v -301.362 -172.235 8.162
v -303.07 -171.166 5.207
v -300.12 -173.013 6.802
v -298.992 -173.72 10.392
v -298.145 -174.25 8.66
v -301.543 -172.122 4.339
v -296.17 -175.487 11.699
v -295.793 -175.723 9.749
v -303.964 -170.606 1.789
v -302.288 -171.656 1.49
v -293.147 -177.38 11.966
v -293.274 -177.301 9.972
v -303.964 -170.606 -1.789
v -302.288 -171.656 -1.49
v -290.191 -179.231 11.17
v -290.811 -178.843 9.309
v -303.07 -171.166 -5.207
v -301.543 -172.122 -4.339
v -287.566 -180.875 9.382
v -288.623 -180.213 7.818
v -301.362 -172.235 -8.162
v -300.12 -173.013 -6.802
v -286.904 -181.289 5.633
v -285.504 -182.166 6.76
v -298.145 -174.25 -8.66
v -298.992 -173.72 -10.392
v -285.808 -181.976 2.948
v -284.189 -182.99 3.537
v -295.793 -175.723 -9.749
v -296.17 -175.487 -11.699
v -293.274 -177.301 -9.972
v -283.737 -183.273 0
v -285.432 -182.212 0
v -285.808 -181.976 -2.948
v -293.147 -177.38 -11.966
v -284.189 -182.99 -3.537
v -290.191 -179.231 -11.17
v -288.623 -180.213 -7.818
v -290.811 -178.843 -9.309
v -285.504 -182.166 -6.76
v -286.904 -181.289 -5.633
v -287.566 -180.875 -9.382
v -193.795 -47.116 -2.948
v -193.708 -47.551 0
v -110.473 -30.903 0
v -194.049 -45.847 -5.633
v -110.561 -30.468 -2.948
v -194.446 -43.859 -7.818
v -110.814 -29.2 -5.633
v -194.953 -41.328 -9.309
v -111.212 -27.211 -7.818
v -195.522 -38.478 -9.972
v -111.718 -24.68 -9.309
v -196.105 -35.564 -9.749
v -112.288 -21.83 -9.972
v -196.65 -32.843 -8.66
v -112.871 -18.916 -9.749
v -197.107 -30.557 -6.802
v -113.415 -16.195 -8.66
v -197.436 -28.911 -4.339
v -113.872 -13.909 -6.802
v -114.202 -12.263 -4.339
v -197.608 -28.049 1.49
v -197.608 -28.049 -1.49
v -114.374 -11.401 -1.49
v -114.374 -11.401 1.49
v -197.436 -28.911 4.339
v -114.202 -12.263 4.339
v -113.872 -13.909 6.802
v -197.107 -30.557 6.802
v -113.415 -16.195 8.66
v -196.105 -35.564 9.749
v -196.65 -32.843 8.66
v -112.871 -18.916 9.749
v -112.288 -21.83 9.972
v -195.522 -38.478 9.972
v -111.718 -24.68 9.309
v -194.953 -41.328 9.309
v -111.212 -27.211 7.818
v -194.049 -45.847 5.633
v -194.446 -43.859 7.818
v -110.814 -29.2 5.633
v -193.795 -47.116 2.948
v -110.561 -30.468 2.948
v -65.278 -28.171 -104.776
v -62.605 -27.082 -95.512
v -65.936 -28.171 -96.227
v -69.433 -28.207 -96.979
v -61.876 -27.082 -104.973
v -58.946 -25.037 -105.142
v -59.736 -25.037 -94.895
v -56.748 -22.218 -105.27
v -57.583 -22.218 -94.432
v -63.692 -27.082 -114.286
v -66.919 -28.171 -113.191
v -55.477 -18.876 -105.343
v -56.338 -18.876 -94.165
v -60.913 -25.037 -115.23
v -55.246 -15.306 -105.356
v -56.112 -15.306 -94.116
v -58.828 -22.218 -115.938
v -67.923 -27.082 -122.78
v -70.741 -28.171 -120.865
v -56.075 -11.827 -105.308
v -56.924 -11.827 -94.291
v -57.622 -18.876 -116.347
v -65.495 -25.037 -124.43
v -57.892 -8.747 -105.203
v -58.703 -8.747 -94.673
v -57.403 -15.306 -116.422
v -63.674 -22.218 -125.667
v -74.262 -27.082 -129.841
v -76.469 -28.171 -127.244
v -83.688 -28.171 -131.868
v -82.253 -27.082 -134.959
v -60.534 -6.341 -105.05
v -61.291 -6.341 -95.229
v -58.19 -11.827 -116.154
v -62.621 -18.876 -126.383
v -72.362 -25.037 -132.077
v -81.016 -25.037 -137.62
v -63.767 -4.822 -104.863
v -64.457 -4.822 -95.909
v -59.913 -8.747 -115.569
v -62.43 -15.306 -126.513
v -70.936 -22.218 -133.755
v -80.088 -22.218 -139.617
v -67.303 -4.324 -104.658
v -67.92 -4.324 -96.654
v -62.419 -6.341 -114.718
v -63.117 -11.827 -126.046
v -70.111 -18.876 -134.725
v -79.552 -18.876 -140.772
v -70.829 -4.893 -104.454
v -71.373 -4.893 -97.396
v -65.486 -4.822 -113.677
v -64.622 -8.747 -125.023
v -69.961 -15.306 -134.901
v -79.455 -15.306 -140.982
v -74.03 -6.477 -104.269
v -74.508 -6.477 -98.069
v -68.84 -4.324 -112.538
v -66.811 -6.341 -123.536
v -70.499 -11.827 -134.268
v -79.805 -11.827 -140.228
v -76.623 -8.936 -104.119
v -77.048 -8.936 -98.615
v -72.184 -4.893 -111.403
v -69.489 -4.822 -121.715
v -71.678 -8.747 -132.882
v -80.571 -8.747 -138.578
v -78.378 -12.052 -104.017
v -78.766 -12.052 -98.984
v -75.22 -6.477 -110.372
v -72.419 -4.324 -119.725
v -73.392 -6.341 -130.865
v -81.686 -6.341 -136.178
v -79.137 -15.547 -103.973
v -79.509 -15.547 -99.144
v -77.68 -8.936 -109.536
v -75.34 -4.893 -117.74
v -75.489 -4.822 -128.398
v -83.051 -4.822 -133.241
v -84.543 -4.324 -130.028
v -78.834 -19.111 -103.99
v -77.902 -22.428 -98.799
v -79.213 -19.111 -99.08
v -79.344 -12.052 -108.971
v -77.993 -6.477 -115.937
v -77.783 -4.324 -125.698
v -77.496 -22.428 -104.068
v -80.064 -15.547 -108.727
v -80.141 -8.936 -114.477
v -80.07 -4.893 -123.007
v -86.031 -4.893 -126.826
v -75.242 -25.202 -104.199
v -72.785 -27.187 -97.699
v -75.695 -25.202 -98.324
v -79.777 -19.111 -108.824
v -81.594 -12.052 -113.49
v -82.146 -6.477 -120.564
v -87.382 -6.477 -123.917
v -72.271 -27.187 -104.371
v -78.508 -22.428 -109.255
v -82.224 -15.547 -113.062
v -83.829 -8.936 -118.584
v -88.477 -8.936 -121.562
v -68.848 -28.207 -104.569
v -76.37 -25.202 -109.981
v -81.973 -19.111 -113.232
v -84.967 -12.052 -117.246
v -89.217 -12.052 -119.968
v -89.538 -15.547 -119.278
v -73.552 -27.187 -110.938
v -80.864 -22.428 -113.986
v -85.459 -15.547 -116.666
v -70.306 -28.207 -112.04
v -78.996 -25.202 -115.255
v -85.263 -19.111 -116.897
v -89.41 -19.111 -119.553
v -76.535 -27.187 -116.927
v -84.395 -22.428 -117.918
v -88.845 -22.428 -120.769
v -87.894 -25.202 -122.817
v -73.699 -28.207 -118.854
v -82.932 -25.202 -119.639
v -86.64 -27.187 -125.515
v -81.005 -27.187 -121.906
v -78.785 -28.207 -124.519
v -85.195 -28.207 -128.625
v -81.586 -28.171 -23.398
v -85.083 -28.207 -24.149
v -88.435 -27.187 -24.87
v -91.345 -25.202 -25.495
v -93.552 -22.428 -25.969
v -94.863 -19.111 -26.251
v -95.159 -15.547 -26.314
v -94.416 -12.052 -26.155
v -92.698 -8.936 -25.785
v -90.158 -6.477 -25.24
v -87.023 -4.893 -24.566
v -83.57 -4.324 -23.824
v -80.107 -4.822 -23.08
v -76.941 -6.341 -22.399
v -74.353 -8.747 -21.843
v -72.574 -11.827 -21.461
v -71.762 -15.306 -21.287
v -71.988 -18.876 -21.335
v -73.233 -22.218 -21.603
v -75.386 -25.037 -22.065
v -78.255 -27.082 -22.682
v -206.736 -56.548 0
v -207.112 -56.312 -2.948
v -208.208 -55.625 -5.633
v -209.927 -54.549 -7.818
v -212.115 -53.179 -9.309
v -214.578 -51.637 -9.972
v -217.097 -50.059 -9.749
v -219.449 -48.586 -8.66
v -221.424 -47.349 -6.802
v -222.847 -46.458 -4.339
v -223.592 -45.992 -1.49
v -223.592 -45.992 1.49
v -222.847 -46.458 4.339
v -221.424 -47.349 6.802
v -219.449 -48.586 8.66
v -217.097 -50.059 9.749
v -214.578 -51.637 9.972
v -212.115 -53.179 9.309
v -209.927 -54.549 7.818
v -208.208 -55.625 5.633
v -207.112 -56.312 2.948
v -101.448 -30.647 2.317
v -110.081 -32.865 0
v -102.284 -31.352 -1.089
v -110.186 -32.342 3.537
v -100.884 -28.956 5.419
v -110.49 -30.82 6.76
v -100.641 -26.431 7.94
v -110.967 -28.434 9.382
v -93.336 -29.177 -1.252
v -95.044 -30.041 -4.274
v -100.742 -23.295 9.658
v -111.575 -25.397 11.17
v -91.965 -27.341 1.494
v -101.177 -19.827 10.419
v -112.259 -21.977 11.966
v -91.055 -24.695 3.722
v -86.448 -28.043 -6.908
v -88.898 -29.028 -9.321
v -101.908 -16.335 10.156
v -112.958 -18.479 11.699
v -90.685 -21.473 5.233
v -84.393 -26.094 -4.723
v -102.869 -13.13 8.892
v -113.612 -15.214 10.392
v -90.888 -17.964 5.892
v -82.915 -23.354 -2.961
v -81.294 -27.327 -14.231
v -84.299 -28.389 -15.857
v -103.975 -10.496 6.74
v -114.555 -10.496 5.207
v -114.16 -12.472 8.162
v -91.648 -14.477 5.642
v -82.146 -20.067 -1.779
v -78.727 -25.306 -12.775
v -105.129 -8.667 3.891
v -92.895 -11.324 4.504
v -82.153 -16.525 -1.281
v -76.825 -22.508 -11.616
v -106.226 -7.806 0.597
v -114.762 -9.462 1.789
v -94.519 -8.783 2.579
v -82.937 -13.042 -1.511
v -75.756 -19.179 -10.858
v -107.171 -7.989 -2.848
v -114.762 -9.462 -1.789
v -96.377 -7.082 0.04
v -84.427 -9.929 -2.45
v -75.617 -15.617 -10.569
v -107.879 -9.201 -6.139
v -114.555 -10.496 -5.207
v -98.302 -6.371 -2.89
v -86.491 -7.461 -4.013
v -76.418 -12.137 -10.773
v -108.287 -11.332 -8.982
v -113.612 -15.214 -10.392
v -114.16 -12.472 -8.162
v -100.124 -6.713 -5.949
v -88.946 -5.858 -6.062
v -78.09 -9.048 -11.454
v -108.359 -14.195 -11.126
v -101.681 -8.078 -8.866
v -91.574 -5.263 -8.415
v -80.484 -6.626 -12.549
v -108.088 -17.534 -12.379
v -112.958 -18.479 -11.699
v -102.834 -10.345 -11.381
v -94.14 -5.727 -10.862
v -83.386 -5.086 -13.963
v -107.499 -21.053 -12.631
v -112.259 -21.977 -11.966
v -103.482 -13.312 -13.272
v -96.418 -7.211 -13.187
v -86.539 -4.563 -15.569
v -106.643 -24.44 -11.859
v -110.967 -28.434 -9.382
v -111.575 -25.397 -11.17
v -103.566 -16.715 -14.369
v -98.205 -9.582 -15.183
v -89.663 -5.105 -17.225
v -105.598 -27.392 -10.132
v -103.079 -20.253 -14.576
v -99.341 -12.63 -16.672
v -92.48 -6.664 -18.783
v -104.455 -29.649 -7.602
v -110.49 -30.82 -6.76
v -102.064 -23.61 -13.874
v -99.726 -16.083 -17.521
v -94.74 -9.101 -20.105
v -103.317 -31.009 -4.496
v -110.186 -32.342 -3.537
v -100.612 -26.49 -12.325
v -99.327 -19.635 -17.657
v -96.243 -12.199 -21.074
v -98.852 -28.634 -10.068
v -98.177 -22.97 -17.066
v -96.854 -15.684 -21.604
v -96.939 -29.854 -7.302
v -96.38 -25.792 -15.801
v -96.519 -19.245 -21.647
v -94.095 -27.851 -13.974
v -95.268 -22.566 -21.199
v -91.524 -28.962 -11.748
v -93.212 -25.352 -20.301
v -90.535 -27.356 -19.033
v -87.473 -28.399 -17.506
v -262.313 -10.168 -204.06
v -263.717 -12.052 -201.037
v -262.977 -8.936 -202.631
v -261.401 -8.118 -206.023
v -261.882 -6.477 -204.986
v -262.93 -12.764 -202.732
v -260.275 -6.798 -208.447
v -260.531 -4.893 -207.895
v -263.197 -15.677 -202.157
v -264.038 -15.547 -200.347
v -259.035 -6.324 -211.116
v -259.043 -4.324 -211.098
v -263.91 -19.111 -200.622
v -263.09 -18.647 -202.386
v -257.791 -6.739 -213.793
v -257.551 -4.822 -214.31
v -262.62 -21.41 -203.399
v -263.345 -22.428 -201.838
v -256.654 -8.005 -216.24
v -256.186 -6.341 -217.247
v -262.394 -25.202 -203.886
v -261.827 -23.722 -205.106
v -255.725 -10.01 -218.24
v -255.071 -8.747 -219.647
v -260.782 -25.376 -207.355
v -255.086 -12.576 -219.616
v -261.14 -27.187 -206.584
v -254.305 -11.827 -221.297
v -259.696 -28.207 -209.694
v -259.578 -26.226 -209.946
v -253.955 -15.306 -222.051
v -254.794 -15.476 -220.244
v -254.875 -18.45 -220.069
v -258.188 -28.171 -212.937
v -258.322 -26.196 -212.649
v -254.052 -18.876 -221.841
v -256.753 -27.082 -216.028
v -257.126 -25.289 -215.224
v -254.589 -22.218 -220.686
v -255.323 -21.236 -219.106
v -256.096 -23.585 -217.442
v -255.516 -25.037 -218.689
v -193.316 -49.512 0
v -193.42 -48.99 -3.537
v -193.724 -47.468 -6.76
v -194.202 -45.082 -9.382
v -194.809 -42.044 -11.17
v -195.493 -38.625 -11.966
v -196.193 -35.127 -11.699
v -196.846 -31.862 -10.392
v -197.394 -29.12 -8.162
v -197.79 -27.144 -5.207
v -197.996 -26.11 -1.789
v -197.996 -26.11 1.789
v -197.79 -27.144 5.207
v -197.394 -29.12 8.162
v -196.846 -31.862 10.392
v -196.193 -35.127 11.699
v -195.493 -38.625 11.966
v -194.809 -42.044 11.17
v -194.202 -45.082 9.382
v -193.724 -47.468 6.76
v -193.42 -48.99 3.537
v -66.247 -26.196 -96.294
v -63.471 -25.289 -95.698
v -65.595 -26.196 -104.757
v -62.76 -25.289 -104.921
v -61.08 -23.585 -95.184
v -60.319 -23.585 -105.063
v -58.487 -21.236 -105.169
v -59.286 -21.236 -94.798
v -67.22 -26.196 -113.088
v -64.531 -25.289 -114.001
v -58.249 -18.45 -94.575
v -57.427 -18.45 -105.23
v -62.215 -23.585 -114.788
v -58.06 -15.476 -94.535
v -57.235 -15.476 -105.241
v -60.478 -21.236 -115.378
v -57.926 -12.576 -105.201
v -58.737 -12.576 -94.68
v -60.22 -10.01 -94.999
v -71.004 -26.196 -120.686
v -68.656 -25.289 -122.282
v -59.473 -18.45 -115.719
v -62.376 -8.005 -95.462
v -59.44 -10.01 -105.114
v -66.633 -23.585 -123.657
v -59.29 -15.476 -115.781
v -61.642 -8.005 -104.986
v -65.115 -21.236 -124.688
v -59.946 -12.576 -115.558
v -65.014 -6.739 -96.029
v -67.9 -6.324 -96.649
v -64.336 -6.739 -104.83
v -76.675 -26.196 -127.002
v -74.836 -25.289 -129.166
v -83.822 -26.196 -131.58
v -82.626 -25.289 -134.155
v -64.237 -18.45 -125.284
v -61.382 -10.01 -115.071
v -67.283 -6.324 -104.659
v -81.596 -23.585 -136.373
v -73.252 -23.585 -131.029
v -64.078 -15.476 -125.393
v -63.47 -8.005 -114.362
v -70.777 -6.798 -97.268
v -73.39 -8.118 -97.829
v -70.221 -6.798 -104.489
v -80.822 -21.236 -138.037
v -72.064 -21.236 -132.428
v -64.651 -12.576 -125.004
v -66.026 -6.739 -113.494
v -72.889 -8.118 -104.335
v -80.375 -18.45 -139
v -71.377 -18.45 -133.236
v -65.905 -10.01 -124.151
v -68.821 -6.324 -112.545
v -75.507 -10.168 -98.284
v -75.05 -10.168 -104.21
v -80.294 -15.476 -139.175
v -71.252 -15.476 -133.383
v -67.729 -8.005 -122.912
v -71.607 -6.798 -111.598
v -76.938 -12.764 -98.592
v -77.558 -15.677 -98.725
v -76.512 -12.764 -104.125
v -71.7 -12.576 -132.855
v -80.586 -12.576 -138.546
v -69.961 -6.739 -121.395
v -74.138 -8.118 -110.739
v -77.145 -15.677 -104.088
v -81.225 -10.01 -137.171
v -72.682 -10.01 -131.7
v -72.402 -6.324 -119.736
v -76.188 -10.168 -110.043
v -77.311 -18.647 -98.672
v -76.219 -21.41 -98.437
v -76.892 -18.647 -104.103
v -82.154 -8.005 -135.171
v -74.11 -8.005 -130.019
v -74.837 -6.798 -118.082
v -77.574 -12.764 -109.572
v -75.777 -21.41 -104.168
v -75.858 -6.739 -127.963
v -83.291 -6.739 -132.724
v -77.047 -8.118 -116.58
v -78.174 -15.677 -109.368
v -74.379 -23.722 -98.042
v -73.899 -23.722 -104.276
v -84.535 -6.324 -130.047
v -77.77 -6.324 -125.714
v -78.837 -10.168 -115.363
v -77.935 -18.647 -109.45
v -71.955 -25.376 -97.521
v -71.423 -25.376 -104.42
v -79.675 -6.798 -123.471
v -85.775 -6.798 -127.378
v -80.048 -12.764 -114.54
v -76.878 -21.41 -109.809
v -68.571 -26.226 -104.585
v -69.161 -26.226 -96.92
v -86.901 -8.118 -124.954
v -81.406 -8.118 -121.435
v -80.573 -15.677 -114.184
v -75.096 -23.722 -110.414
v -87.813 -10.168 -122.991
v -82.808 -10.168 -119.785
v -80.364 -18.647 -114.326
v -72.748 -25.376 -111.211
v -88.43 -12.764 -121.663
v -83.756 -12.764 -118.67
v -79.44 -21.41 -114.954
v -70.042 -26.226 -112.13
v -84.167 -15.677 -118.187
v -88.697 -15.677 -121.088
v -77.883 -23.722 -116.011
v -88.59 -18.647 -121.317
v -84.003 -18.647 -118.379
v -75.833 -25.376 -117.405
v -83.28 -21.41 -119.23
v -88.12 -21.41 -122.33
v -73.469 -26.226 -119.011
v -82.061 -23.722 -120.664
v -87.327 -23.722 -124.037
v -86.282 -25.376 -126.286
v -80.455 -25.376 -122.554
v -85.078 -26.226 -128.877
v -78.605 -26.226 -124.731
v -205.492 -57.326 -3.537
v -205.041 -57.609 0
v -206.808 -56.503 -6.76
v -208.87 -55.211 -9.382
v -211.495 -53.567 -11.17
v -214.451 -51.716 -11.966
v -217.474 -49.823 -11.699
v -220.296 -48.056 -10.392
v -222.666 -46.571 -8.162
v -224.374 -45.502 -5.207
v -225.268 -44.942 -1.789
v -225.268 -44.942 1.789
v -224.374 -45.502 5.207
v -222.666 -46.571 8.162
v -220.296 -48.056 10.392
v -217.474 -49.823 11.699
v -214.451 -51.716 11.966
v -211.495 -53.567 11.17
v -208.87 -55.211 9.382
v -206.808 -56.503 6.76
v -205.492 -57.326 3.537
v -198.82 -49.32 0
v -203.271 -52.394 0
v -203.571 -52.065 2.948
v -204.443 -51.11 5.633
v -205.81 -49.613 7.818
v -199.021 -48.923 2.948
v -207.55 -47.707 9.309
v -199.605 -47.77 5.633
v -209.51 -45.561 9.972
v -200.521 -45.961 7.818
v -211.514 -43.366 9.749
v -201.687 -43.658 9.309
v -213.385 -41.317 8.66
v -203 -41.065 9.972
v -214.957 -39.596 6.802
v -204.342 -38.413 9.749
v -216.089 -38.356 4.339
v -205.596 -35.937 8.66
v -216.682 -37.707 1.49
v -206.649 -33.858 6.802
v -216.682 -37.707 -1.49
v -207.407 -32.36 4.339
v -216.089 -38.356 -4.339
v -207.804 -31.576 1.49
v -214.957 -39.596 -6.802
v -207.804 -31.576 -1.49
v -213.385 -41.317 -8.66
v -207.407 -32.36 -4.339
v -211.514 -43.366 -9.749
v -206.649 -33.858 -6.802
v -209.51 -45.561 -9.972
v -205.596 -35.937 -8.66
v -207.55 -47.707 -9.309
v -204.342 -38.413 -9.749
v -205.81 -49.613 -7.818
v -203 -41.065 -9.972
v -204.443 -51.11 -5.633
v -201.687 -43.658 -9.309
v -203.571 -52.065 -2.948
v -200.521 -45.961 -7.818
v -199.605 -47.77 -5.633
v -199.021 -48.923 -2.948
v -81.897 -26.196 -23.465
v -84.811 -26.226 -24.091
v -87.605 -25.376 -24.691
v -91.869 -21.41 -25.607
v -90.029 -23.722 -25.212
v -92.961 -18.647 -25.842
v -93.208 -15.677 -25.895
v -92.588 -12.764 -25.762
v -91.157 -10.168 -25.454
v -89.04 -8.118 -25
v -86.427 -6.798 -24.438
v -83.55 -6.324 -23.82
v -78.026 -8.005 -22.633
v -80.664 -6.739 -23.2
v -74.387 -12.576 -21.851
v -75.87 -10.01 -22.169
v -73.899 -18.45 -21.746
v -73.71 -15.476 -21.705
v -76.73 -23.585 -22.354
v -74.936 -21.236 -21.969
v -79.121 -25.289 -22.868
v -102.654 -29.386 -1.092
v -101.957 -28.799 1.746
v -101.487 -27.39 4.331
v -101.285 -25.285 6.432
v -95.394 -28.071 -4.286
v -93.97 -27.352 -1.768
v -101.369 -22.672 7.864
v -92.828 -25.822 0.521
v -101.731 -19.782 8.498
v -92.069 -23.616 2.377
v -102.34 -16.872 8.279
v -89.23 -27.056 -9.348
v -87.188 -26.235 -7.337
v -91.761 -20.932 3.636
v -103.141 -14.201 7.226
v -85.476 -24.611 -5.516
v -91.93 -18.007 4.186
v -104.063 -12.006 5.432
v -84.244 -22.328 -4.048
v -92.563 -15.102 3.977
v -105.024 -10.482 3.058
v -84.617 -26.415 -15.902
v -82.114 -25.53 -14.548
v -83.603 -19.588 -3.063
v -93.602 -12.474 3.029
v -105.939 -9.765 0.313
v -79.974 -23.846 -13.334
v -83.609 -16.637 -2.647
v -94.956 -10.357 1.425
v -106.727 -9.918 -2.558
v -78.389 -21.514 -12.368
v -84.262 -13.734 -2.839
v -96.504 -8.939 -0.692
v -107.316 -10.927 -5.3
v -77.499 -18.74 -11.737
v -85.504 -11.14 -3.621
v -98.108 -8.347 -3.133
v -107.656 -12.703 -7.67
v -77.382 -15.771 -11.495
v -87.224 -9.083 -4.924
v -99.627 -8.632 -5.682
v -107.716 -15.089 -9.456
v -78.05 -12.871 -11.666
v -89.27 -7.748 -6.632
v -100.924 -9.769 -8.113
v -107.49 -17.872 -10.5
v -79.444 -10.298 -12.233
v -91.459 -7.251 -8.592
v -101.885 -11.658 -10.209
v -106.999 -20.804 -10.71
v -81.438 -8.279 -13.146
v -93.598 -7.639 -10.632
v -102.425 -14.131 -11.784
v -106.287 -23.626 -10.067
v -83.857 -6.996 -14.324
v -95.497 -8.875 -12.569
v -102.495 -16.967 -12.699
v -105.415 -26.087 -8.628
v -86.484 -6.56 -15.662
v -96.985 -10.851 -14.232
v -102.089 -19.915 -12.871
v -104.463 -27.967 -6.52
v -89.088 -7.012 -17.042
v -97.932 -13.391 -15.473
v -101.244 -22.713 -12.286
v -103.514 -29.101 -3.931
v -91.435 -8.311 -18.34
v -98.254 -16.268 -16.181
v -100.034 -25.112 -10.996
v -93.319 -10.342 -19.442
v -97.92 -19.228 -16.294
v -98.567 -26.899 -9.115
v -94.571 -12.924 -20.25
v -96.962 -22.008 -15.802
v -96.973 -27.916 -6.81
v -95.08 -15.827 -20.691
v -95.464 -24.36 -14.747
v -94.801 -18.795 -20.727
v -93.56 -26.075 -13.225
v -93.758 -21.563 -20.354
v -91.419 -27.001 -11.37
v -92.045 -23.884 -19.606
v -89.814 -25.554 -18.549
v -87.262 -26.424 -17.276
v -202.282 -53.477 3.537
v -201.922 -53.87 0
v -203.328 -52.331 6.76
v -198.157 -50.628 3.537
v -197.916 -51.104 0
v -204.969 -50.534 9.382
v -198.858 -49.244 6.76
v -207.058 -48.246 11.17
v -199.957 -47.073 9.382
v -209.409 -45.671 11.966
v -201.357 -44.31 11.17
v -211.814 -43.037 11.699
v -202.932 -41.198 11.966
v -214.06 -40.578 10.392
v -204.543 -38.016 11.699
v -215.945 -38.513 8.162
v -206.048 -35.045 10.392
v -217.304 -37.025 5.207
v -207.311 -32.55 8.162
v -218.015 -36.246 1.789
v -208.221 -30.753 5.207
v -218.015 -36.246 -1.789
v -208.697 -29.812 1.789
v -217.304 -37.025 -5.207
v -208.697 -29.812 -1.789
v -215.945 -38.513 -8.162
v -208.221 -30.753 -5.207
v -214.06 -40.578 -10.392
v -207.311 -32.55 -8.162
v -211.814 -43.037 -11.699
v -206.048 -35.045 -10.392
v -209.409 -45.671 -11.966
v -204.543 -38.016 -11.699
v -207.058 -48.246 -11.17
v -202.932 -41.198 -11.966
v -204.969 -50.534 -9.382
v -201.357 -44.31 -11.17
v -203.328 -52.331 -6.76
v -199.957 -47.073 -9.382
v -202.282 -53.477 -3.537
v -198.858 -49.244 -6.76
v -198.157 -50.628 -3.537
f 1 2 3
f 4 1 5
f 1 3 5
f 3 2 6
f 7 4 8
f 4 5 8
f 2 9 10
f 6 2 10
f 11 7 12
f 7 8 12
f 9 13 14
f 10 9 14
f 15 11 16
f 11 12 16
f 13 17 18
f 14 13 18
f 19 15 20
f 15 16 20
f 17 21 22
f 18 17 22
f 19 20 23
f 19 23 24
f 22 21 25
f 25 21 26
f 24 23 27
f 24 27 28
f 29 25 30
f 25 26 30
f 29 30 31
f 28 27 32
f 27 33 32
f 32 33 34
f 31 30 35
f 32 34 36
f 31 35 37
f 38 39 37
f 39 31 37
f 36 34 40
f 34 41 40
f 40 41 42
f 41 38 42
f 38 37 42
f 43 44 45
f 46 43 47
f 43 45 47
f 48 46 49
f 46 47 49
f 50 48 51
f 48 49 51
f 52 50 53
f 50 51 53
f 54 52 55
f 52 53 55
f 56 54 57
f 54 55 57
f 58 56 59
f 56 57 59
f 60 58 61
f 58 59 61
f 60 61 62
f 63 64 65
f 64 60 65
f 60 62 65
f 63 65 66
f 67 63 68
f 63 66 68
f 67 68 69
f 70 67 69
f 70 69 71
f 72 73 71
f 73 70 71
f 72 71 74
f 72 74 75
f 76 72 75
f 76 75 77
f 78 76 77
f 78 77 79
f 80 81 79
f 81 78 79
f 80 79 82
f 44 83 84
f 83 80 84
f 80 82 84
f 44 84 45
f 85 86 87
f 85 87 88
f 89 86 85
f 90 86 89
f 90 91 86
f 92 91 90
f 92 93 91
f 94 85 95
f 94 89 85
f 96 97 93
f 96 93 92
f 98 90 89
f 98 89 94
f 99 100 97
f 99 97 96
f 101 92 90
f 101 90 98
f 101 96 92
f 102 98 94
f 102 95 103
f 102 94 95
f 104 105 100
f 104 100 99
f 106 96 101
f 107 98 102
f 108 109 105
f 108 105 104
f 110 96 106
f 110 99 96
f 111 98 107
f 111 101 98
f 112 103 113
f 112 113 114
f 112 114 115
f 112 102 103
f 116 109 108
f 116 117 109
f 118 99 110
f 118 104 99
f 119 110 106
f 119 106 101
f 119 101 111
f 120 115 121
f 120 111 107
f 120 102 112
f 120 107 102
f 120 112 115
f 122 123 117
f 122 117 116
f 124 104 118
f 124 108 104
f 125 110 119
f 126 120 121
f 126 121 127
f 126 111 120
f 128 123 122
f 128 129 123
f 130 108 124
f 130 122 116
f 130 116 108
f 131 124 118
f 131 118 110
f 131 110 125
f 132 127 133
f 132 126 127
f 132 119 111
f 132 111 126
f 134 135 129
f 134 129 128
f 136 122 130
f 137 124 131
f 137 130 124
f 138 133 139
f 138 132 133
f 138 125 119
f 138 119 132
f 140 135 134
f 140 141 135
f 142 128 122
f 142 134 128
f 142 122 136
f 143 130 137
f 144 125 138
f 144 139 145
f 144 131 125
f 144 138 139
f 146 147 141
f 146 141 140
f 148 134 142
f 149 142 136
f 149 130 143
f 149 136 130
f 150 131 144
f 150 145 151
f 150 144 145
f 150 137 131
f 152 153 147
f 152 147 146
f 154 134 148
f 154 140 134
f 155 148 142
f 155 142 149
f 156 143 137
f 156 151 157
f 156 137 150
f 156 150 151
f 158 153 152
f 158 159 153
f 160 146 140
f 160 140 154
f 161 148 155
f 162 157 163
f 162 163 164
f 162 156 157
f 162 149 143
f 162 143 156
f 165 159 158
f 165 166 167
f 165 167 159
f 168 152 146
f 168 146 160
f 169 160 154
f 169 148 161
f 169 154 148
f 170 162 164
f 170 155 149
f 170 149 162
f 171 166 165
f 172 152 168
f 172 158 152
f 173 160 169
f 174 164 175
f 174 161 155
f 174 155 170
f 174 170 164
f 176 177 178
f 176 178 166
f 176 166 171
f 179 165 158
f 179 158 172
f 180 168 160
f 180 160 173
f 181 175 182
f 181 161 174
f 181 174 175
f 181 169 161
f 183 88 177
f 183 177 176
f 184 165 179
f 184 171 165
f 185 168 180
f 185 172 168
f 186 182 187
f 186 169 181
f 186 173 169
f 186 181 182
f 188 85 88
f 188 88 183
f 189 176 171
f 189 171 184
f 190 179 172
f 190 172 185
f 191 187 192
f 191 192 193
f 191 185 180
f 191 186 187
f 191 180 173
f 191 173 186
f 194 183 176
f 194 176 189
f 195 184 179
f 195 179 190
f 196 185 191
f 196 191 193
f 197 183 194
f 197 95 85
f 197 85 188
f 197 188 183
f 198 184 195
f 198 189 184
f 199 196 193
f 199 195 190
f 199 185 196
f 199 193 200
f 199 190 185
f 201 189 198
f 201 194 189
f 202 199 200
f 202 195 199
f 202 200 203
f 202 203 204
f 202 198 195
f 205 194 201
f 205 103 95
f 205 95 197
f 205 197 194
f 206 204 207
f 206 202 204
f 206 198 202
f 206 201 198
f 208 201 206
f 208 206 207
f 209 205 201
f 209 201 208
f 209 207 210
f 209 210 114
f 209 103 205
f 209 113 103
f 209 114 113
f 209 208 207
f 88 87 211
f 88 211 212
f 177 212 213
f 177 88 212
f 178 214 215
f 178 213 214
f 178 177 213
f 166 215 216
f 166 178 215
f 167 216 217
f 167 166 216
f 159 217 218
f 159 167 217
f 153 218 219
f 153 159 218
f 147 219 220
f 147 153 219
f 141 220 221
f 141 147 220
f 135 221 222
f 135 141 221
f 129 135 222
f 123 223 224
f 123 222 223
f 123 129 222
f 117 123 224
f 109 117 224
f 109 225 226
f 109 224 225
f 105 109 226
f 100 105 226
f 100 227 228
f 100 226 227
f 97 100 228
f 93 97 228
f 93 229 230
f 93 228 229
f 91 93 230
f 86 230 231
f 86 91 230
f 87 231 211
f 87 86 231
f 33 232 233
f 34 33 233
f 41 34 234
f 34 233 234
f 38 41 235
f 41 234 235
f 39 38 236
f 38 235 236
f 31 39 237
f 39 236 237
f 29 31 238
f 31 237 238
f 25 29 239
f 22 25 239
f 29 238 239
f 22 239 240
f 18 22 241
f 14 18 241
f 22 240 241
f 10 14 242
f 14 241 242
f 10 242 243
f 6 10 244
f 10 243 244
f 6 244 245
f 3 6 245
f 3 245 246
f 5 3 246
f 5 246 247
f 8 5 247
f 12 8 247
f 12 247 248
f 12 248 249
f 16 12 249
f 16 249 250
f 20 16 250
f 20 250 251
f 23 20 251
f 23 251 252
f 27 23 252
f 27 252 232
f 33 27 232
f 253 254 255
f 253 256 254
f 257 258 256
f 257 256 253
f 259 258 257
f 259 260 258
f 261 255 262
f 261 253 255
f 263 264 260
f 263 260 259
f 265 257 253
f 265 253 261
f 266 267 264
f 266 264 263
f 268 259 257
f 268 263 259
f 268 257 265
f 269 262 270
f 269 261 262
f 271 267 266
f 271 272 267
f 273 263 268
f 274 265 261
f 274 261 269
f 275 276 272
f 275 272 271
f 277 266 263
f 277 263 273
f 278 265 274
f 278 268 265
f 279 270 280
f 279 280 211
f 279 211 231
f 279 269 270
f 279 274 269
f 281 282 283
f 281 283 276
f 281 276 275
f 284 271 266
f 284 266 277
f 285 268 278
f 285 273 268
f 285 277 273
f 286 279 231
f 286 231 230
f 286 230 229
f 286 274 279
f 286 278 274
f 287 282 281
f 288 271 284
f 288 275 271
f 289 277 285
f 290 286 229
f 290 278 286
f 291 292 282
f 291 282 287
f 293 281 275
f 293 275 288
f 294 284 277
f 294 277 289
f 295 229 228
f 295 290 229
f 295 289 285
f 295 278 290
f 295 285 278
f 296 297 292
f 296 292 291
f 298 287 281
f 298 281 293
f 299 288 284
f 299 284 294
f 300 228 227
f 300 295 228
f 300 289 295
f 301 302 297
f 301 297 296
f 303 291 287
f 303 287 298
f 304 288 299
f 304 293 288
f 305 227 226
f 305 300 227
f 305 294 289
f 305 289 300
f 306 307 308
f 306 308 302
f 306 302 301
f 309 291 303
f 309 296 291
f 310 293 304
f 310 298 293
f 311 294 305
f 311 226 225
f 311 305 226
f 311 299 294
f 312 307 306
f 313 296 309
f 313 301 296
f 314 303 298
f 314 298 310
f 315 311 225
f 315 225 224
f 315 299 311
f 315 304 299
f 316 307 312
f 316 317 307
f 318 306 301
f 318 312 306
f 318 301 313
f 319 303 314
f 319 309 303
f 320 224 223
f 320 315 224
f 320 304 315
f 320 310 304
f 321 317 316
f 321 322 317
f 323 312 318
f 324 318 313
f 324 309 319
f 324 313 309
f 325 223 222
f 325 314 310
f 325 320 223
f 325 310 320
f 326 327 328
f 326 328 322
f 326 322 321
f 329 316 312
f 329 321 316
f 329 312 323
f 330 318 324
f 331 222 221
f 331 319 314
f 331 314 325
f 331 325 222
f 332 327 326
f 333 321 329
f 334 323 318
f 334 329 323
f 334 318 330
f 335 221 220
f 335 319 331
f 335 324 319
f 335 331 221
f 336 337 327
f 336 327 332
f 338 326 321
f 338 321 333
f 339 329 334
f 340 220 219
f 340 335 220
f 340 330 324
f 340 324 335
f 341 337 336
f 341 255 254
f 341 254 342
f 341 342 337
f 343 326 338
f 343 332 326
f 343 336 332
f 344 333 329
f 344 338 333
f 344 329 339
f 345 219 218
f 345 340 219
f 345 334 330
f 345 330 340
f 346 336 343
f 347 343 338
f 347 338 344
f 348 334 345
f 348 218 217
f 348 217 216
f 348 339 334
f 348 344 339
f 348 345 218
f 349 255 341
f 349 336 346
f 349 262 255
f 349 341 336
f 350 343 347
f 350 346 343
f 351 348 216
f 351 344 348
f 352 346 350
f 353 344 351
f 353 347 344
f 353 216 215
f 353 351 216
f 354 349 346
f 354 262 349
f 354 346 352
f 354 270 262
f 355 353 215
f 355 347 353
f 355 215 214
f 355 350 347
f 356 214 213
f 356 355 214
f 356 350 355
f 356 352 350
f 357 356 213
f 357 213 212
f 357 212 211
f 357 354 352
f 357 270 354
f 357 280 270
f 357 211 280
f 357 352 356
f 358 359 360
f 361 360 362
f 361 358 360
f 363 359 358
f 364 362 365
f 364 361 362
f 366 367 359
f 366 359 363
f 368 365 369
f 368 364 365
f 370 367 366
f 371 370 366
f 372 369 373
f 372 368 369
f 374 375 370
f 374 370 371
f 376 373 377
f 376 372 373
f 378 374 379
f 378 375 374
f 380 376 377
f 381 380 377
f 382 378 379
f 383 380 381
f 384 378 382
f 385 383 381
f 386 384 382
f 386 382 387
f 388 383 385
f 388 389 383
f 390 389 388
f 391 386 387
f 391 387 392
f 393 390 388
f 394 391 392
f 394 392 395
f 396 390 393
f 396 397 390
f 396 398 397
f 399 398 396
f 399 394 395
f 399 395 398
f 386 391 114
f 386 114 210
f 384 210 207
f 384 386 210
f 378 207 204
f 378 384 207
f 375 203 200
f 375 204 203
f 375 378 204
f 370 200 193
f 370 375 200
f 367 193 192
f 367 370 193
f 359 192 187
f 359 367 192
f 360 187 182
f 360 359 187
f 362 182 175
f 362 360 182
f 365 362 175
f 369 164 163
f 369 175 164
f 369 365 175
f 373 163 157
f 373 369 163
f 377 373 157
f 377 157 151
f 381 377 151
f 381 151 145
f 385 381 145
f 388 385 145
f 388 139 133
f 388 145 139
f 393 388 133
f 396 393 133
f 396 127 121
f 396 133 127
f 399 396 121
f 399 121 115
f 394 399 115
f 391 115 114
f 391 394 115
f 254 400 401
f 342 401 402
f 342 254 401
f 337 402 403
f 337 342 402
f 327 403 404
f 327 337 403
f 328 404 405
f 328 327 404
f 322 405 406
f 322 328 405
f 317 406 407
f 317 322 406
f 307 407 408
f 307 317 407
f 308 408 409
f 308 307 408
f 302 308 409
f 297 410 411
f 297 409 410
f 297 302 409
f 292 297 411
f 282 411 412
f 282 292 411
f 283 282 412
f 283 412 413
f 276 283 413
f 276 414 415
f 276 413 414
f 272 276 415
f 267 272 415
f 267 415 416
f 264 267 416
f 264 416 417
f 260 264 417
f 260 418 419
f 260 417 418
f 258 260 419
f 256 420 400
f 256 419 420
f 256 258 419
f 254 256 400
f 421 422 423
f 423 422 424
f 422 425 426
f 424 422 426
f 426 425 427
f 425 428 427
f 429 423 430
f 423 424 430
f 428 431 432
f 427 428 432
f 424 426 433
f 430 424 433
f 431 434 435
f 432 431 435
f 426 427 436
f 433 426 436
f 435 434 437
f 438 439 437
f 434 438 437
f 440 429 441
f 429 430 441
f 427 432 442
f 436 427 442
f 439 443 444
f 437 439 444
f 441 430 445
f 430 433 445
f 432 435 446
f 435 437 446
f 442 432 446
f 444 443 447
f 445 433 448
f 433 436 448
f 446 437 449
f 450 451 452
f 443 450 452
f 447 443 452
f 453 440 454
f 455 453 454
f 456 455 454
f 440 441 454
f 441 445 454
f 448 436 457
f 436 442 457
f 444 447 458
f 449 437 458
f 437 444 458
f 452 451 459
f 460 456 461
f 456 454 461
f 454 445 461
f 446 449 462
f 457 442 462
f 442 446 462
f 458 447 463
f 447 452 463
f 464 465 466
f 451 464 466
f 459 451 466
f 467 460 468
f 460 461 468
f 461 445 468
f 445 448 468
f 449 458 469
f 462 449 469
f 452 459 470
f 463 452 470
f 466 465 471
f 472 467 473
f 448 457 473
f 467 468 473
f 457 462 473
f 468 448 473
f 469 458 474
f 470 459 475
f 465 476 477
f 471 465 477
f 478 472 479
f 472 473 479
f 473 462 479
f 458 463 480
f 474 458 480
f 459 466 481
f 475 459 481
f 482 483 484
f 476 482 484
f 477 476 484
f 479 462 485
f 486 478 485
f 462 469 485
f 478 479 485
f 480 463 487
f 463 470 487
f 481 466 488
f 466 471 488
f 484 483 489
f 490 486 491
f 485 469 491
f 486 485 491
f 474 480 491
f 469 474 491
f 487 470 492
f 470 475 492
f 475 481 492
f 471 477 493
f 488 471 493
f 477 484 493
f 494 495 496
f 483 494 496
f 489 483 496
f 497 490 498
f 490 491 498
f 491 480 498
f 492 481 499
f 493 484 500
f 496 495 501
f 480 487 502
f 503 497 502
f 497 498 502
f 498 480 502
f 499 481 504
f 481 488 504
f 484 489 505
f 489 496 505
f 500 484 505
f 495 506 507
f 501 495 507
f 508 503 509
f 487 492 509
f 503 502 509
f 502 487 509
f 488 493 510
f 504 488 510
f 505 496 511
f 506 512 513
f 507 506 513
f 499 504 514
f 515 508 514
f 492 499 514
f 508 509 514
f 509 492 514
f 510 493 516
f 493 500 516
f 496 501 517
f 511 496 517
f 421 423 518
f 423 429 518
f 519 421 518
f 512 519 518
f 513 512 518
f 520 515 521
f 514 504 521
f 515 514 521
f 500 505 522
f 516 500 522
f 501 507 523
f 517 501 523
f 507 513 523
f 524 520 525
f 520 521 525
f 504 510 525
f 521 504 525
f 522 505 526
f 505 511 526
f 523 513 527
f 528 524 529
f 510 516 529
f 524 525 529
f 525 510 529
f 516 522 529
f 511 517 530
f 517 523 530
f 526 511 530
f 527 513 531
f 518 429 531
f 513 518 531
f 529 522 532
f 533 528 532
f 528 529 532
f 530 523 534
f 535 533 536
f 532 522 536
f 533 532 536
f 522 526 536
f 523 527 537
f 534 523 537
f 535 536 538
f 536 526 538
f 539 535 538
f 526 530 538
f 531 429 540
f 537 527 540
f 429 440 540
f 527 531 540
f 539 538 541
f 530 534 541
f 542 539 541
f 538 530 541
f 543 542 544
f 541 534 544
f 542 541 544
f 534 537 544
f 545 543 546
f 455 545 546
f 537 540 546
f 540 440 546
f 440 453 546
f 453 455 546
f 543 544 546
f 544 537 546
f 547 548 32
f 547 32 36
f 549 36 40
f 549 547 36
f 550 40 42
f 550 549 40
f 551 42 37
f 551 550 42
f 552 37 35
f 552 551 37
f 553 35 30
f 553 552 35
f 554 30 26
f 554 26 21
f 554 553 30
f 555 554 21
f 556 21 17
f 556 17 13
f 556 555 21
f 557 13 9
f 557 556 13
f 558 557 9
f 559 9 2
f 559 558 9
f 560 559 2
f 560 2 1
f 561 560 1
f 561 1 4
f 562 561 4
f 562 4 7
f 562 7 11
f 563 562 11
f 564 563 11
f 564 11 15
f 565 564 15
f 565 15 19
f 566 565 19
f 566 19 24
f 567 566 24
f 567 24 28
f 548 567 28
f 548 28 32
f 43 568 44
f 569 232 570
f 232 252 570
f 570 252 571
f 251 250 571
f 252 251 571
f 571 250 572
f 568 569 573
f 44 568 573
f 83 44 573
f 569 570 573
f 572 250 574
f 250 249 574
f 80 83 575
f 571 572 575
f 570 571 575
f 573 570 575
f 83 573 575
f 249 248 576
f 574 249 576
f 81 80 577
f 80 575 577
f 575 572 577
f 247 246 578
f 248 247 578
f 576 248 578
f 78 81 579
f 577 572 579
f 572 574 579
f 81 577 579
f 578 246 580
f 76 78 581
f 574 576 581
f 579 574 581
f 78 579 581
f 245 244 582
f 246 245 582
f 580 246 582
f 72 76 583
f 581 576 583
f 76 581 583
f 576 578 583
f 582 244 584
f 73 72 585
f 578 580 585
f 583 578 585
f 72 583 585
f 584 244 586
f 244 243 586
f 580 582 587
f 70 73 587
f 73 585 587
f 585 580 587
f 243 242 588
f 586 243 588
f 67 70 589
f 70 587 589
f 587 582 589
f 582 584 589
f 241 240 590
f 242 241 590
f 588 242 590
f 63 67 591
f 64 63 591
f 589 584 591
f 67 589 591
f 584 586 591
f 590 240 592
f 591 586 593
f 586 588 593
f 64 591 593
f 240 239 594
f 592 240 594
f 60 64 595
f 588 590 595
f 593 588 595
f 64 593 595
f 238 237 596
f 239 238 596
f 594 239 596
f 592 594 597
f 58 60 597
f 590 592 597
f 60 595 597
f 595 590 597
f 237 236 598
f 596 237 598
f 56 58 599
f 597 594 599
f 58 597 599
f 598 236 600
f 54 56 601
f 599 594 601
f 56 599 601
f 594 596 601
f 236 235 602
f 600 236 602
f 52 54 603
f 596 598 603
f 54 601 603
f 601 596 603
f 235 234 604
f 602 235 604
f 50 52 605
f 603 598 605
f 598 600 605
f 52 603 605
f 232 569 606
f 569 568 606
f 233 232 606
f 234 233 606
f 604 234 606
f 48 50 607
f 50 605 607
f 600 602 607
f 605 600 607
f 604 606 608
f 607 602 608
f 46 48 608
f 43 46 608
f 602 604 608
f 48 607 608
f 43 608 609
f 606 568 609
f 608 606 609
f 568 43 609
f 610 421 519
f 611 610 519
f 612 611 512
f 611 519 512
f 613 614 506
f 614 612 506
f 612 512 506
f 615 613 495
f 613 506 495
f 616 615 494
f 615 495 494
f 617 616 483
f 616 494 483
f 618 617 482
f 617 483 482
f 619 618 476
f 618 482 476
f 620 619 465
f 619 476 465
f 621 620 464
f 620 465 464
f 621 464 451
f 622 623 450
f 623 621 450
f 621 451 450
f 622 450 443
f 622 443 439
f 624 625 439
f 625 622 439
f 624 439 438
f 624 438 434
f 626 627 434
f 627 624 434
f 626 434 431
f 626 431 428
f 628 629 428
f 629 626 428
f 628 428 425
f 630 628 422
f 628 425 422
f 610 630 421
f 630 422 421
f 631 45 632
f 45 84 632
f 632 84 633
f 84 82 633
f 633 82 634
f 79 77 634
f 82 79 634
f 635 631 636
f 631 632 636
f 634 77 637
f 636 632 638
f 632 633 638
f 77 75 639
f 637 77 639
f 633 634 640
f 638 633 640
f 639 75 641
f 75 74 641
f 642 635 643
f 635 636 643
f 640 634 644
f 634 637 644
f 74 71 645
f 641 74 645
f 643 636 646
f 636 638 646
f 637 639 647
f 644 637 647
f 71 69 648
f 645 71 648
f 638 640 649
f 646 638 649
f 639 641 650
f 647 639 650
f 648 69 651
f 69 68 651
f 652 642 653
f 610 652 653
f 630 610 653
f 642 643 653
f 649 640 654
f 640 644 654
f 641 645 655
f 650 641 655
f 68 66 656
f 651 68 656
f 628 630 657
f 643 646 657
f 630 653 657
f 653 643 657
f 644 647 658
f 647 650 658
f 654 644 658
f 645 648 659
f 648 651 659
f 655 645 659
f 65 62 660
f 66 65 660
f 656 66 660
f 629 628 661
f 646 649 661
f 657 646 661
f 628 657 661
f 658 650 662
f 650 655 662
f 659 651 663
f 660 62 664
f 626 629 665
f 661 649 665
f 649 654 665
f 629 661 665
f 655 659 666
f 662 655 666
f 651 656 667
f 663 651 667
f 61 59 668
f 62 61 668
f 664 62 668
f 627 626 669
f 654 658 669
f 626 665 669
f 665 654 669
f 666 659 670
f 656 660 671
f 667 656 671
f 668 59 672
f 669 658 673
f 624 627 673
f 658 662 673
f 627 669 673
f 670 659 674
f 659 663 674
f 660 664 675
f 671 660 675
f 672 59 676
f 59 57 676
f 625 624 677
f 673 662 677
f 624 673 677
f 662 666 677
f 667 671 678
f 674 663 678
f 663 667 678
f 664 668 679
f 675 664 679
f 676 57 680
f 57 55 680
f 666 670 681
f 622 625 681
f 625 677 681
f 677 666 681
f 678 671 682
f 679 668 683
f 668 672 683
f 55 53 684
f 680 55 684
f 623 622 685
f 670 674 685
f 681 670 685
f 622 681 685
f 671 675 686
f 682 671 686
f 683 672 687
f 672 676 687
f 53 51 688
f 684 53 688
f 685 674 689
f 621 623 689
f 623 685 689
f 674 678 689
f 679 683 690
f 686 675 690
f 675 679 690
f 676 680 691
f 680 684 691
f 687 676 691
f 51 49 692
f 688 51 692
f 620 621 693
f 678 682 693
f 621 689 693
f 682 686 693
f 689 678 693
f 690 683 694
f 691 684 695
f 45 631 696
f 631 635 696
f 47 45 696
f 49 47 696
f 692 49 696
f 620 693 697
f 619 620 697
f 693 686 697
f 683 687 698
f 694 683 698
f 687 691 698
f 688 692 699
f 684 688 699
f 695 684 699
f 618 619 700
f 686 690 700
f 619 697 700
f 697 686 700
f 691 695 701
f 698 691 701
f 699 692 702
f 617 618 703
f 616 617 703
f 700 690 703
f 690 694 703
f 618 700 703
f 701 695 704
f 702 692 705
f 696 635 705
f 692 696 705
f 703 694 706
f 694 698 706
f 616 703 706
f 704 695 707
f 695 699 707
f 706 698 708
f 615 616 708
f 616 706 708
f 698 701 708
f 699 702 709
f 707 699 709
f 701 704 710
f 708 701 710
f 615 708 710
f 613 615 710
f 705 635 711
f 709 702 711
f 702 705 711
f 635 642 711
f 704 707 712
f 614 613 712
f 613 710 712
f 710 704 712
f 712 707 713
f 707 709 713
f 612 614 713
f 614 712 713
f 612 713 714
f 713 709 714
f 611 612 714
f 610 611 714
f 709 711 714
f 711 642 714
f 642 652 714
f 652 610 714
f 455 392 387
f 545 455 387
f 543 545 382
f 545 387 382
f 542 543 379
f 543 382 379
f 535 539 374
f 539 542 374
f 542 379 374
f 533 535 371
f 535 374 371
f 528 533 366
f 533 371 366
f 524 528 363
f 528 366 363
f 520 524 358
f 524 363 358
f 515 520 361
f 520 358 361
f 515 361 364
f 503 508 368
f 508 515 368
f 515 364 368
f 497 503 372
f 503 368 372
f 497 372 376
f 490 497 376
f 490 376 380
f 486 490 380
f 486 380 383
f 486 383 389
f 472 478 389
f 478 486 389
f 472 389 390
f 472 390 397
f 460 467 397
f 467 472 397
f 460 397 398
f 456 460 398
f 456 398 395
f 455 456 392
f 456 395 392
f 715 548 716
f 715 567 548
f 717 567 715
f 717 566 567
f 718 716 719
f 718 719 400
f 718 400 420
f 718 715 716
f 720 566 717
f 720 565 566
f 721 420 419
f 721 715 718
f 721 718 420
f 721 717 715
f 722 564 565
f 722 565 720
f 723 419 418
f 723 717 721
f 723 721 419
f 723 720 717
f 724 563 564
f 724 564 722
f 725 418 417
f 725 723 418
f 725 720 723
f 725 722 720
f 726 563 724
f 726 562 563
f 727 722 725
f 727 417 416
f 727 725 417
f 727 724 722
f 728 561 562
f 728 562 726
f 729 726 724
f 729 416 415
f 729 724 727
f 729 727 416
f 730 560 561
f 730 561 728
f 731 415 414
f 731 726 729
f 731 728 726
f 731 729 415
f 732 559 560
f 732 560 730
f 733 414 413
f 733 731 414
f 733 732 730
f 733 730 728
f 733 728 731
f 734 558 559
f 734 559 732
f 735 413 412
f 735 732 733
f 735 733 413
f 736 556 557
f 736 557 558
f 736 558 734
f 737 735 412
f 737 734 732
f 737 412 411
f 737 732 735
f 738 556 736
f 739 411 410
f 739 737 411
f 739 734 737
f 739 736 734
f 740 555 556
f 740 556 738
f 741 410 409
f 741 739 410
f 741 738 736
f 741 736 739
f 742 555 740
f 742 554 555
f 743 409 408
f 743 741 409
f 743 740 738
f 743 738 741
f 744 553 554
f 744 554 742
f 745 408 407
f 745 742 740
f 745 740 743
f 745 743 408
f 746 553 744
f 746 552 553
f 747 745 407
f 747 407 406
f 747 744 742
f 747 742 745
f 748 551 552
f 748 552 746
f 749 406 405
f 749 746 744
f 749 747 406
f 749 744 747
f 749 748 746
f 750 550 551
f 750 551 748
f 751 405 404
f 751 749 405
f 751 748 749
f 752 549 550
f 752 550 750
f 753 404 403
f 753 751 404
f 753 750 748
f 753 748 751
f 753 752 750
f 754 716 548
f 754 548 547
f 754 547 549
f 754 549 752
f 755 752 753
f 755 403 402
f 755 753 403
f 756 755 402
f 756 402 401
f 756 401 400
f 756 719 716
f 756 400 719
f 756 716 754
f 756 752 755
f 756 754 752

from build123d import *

# Parameters (mm, degrees)
SWEEP_1_PROFILE_R   = 12
SWEEP_1_PROFILE_R_2 = 10


with BuildPart() as part:
    # 扫描-薄件1: sweep along a curve in space
    with BuildLine() as sweep_1_path:
        Line((-293.907053201, -176.904078828, 0), (-215.210942182, -51.240174508, 0))
        ThreePointArc((-215.210942182, -51.240174508, 0), (-206.832168677, -42.47680964, 0), (-195.669049964, -37.745510677, 0))
        Line((-195.669049964, -37.745510677, 0), (-112.434772166, -21.097592117, 0))
        ThreePointArc((-83.45170927, -16.323468261, -23.798598546), (-93.844250534, -17.667130883, -6.69804309), (-112.434772166, -21.097592117, 0))
        Line((-83.45170927, -16.323468261, -23.798598546), (-67.801697088, -16.323468261, -96.628223589))
        ThreePointArc((-67.801697088, -16.323468261, -96.628223589), (-70.278739917, -16.323468261, -116.306023698), (-84.49226654, -16.323468261, -130.138131969))
        Line((-84.49226654, -16.323468261, -130.138131969), (-258.992373197, -16.323468261, -211.207155939))
    # 扫描-薄件1 profile (on start of the path) → 扫描-薄件1 (sweep)
    with BuildSketch(Plane(origin=(-293.907053201, -176.904078828, 0), x_dir=(0.8475245838768447, -0.5307561396012122, 0), z_dir=(0.5307561396012122, 0.8475245838768447, 0))):
        Circle(SWEEP_1_PROFILE_R)
        Circle(SWEEP_1_PROFILE_R_2, mode=Mode.SUBTRACT)
    sweep(path=sweep_1_path.line)


solid = part.part
